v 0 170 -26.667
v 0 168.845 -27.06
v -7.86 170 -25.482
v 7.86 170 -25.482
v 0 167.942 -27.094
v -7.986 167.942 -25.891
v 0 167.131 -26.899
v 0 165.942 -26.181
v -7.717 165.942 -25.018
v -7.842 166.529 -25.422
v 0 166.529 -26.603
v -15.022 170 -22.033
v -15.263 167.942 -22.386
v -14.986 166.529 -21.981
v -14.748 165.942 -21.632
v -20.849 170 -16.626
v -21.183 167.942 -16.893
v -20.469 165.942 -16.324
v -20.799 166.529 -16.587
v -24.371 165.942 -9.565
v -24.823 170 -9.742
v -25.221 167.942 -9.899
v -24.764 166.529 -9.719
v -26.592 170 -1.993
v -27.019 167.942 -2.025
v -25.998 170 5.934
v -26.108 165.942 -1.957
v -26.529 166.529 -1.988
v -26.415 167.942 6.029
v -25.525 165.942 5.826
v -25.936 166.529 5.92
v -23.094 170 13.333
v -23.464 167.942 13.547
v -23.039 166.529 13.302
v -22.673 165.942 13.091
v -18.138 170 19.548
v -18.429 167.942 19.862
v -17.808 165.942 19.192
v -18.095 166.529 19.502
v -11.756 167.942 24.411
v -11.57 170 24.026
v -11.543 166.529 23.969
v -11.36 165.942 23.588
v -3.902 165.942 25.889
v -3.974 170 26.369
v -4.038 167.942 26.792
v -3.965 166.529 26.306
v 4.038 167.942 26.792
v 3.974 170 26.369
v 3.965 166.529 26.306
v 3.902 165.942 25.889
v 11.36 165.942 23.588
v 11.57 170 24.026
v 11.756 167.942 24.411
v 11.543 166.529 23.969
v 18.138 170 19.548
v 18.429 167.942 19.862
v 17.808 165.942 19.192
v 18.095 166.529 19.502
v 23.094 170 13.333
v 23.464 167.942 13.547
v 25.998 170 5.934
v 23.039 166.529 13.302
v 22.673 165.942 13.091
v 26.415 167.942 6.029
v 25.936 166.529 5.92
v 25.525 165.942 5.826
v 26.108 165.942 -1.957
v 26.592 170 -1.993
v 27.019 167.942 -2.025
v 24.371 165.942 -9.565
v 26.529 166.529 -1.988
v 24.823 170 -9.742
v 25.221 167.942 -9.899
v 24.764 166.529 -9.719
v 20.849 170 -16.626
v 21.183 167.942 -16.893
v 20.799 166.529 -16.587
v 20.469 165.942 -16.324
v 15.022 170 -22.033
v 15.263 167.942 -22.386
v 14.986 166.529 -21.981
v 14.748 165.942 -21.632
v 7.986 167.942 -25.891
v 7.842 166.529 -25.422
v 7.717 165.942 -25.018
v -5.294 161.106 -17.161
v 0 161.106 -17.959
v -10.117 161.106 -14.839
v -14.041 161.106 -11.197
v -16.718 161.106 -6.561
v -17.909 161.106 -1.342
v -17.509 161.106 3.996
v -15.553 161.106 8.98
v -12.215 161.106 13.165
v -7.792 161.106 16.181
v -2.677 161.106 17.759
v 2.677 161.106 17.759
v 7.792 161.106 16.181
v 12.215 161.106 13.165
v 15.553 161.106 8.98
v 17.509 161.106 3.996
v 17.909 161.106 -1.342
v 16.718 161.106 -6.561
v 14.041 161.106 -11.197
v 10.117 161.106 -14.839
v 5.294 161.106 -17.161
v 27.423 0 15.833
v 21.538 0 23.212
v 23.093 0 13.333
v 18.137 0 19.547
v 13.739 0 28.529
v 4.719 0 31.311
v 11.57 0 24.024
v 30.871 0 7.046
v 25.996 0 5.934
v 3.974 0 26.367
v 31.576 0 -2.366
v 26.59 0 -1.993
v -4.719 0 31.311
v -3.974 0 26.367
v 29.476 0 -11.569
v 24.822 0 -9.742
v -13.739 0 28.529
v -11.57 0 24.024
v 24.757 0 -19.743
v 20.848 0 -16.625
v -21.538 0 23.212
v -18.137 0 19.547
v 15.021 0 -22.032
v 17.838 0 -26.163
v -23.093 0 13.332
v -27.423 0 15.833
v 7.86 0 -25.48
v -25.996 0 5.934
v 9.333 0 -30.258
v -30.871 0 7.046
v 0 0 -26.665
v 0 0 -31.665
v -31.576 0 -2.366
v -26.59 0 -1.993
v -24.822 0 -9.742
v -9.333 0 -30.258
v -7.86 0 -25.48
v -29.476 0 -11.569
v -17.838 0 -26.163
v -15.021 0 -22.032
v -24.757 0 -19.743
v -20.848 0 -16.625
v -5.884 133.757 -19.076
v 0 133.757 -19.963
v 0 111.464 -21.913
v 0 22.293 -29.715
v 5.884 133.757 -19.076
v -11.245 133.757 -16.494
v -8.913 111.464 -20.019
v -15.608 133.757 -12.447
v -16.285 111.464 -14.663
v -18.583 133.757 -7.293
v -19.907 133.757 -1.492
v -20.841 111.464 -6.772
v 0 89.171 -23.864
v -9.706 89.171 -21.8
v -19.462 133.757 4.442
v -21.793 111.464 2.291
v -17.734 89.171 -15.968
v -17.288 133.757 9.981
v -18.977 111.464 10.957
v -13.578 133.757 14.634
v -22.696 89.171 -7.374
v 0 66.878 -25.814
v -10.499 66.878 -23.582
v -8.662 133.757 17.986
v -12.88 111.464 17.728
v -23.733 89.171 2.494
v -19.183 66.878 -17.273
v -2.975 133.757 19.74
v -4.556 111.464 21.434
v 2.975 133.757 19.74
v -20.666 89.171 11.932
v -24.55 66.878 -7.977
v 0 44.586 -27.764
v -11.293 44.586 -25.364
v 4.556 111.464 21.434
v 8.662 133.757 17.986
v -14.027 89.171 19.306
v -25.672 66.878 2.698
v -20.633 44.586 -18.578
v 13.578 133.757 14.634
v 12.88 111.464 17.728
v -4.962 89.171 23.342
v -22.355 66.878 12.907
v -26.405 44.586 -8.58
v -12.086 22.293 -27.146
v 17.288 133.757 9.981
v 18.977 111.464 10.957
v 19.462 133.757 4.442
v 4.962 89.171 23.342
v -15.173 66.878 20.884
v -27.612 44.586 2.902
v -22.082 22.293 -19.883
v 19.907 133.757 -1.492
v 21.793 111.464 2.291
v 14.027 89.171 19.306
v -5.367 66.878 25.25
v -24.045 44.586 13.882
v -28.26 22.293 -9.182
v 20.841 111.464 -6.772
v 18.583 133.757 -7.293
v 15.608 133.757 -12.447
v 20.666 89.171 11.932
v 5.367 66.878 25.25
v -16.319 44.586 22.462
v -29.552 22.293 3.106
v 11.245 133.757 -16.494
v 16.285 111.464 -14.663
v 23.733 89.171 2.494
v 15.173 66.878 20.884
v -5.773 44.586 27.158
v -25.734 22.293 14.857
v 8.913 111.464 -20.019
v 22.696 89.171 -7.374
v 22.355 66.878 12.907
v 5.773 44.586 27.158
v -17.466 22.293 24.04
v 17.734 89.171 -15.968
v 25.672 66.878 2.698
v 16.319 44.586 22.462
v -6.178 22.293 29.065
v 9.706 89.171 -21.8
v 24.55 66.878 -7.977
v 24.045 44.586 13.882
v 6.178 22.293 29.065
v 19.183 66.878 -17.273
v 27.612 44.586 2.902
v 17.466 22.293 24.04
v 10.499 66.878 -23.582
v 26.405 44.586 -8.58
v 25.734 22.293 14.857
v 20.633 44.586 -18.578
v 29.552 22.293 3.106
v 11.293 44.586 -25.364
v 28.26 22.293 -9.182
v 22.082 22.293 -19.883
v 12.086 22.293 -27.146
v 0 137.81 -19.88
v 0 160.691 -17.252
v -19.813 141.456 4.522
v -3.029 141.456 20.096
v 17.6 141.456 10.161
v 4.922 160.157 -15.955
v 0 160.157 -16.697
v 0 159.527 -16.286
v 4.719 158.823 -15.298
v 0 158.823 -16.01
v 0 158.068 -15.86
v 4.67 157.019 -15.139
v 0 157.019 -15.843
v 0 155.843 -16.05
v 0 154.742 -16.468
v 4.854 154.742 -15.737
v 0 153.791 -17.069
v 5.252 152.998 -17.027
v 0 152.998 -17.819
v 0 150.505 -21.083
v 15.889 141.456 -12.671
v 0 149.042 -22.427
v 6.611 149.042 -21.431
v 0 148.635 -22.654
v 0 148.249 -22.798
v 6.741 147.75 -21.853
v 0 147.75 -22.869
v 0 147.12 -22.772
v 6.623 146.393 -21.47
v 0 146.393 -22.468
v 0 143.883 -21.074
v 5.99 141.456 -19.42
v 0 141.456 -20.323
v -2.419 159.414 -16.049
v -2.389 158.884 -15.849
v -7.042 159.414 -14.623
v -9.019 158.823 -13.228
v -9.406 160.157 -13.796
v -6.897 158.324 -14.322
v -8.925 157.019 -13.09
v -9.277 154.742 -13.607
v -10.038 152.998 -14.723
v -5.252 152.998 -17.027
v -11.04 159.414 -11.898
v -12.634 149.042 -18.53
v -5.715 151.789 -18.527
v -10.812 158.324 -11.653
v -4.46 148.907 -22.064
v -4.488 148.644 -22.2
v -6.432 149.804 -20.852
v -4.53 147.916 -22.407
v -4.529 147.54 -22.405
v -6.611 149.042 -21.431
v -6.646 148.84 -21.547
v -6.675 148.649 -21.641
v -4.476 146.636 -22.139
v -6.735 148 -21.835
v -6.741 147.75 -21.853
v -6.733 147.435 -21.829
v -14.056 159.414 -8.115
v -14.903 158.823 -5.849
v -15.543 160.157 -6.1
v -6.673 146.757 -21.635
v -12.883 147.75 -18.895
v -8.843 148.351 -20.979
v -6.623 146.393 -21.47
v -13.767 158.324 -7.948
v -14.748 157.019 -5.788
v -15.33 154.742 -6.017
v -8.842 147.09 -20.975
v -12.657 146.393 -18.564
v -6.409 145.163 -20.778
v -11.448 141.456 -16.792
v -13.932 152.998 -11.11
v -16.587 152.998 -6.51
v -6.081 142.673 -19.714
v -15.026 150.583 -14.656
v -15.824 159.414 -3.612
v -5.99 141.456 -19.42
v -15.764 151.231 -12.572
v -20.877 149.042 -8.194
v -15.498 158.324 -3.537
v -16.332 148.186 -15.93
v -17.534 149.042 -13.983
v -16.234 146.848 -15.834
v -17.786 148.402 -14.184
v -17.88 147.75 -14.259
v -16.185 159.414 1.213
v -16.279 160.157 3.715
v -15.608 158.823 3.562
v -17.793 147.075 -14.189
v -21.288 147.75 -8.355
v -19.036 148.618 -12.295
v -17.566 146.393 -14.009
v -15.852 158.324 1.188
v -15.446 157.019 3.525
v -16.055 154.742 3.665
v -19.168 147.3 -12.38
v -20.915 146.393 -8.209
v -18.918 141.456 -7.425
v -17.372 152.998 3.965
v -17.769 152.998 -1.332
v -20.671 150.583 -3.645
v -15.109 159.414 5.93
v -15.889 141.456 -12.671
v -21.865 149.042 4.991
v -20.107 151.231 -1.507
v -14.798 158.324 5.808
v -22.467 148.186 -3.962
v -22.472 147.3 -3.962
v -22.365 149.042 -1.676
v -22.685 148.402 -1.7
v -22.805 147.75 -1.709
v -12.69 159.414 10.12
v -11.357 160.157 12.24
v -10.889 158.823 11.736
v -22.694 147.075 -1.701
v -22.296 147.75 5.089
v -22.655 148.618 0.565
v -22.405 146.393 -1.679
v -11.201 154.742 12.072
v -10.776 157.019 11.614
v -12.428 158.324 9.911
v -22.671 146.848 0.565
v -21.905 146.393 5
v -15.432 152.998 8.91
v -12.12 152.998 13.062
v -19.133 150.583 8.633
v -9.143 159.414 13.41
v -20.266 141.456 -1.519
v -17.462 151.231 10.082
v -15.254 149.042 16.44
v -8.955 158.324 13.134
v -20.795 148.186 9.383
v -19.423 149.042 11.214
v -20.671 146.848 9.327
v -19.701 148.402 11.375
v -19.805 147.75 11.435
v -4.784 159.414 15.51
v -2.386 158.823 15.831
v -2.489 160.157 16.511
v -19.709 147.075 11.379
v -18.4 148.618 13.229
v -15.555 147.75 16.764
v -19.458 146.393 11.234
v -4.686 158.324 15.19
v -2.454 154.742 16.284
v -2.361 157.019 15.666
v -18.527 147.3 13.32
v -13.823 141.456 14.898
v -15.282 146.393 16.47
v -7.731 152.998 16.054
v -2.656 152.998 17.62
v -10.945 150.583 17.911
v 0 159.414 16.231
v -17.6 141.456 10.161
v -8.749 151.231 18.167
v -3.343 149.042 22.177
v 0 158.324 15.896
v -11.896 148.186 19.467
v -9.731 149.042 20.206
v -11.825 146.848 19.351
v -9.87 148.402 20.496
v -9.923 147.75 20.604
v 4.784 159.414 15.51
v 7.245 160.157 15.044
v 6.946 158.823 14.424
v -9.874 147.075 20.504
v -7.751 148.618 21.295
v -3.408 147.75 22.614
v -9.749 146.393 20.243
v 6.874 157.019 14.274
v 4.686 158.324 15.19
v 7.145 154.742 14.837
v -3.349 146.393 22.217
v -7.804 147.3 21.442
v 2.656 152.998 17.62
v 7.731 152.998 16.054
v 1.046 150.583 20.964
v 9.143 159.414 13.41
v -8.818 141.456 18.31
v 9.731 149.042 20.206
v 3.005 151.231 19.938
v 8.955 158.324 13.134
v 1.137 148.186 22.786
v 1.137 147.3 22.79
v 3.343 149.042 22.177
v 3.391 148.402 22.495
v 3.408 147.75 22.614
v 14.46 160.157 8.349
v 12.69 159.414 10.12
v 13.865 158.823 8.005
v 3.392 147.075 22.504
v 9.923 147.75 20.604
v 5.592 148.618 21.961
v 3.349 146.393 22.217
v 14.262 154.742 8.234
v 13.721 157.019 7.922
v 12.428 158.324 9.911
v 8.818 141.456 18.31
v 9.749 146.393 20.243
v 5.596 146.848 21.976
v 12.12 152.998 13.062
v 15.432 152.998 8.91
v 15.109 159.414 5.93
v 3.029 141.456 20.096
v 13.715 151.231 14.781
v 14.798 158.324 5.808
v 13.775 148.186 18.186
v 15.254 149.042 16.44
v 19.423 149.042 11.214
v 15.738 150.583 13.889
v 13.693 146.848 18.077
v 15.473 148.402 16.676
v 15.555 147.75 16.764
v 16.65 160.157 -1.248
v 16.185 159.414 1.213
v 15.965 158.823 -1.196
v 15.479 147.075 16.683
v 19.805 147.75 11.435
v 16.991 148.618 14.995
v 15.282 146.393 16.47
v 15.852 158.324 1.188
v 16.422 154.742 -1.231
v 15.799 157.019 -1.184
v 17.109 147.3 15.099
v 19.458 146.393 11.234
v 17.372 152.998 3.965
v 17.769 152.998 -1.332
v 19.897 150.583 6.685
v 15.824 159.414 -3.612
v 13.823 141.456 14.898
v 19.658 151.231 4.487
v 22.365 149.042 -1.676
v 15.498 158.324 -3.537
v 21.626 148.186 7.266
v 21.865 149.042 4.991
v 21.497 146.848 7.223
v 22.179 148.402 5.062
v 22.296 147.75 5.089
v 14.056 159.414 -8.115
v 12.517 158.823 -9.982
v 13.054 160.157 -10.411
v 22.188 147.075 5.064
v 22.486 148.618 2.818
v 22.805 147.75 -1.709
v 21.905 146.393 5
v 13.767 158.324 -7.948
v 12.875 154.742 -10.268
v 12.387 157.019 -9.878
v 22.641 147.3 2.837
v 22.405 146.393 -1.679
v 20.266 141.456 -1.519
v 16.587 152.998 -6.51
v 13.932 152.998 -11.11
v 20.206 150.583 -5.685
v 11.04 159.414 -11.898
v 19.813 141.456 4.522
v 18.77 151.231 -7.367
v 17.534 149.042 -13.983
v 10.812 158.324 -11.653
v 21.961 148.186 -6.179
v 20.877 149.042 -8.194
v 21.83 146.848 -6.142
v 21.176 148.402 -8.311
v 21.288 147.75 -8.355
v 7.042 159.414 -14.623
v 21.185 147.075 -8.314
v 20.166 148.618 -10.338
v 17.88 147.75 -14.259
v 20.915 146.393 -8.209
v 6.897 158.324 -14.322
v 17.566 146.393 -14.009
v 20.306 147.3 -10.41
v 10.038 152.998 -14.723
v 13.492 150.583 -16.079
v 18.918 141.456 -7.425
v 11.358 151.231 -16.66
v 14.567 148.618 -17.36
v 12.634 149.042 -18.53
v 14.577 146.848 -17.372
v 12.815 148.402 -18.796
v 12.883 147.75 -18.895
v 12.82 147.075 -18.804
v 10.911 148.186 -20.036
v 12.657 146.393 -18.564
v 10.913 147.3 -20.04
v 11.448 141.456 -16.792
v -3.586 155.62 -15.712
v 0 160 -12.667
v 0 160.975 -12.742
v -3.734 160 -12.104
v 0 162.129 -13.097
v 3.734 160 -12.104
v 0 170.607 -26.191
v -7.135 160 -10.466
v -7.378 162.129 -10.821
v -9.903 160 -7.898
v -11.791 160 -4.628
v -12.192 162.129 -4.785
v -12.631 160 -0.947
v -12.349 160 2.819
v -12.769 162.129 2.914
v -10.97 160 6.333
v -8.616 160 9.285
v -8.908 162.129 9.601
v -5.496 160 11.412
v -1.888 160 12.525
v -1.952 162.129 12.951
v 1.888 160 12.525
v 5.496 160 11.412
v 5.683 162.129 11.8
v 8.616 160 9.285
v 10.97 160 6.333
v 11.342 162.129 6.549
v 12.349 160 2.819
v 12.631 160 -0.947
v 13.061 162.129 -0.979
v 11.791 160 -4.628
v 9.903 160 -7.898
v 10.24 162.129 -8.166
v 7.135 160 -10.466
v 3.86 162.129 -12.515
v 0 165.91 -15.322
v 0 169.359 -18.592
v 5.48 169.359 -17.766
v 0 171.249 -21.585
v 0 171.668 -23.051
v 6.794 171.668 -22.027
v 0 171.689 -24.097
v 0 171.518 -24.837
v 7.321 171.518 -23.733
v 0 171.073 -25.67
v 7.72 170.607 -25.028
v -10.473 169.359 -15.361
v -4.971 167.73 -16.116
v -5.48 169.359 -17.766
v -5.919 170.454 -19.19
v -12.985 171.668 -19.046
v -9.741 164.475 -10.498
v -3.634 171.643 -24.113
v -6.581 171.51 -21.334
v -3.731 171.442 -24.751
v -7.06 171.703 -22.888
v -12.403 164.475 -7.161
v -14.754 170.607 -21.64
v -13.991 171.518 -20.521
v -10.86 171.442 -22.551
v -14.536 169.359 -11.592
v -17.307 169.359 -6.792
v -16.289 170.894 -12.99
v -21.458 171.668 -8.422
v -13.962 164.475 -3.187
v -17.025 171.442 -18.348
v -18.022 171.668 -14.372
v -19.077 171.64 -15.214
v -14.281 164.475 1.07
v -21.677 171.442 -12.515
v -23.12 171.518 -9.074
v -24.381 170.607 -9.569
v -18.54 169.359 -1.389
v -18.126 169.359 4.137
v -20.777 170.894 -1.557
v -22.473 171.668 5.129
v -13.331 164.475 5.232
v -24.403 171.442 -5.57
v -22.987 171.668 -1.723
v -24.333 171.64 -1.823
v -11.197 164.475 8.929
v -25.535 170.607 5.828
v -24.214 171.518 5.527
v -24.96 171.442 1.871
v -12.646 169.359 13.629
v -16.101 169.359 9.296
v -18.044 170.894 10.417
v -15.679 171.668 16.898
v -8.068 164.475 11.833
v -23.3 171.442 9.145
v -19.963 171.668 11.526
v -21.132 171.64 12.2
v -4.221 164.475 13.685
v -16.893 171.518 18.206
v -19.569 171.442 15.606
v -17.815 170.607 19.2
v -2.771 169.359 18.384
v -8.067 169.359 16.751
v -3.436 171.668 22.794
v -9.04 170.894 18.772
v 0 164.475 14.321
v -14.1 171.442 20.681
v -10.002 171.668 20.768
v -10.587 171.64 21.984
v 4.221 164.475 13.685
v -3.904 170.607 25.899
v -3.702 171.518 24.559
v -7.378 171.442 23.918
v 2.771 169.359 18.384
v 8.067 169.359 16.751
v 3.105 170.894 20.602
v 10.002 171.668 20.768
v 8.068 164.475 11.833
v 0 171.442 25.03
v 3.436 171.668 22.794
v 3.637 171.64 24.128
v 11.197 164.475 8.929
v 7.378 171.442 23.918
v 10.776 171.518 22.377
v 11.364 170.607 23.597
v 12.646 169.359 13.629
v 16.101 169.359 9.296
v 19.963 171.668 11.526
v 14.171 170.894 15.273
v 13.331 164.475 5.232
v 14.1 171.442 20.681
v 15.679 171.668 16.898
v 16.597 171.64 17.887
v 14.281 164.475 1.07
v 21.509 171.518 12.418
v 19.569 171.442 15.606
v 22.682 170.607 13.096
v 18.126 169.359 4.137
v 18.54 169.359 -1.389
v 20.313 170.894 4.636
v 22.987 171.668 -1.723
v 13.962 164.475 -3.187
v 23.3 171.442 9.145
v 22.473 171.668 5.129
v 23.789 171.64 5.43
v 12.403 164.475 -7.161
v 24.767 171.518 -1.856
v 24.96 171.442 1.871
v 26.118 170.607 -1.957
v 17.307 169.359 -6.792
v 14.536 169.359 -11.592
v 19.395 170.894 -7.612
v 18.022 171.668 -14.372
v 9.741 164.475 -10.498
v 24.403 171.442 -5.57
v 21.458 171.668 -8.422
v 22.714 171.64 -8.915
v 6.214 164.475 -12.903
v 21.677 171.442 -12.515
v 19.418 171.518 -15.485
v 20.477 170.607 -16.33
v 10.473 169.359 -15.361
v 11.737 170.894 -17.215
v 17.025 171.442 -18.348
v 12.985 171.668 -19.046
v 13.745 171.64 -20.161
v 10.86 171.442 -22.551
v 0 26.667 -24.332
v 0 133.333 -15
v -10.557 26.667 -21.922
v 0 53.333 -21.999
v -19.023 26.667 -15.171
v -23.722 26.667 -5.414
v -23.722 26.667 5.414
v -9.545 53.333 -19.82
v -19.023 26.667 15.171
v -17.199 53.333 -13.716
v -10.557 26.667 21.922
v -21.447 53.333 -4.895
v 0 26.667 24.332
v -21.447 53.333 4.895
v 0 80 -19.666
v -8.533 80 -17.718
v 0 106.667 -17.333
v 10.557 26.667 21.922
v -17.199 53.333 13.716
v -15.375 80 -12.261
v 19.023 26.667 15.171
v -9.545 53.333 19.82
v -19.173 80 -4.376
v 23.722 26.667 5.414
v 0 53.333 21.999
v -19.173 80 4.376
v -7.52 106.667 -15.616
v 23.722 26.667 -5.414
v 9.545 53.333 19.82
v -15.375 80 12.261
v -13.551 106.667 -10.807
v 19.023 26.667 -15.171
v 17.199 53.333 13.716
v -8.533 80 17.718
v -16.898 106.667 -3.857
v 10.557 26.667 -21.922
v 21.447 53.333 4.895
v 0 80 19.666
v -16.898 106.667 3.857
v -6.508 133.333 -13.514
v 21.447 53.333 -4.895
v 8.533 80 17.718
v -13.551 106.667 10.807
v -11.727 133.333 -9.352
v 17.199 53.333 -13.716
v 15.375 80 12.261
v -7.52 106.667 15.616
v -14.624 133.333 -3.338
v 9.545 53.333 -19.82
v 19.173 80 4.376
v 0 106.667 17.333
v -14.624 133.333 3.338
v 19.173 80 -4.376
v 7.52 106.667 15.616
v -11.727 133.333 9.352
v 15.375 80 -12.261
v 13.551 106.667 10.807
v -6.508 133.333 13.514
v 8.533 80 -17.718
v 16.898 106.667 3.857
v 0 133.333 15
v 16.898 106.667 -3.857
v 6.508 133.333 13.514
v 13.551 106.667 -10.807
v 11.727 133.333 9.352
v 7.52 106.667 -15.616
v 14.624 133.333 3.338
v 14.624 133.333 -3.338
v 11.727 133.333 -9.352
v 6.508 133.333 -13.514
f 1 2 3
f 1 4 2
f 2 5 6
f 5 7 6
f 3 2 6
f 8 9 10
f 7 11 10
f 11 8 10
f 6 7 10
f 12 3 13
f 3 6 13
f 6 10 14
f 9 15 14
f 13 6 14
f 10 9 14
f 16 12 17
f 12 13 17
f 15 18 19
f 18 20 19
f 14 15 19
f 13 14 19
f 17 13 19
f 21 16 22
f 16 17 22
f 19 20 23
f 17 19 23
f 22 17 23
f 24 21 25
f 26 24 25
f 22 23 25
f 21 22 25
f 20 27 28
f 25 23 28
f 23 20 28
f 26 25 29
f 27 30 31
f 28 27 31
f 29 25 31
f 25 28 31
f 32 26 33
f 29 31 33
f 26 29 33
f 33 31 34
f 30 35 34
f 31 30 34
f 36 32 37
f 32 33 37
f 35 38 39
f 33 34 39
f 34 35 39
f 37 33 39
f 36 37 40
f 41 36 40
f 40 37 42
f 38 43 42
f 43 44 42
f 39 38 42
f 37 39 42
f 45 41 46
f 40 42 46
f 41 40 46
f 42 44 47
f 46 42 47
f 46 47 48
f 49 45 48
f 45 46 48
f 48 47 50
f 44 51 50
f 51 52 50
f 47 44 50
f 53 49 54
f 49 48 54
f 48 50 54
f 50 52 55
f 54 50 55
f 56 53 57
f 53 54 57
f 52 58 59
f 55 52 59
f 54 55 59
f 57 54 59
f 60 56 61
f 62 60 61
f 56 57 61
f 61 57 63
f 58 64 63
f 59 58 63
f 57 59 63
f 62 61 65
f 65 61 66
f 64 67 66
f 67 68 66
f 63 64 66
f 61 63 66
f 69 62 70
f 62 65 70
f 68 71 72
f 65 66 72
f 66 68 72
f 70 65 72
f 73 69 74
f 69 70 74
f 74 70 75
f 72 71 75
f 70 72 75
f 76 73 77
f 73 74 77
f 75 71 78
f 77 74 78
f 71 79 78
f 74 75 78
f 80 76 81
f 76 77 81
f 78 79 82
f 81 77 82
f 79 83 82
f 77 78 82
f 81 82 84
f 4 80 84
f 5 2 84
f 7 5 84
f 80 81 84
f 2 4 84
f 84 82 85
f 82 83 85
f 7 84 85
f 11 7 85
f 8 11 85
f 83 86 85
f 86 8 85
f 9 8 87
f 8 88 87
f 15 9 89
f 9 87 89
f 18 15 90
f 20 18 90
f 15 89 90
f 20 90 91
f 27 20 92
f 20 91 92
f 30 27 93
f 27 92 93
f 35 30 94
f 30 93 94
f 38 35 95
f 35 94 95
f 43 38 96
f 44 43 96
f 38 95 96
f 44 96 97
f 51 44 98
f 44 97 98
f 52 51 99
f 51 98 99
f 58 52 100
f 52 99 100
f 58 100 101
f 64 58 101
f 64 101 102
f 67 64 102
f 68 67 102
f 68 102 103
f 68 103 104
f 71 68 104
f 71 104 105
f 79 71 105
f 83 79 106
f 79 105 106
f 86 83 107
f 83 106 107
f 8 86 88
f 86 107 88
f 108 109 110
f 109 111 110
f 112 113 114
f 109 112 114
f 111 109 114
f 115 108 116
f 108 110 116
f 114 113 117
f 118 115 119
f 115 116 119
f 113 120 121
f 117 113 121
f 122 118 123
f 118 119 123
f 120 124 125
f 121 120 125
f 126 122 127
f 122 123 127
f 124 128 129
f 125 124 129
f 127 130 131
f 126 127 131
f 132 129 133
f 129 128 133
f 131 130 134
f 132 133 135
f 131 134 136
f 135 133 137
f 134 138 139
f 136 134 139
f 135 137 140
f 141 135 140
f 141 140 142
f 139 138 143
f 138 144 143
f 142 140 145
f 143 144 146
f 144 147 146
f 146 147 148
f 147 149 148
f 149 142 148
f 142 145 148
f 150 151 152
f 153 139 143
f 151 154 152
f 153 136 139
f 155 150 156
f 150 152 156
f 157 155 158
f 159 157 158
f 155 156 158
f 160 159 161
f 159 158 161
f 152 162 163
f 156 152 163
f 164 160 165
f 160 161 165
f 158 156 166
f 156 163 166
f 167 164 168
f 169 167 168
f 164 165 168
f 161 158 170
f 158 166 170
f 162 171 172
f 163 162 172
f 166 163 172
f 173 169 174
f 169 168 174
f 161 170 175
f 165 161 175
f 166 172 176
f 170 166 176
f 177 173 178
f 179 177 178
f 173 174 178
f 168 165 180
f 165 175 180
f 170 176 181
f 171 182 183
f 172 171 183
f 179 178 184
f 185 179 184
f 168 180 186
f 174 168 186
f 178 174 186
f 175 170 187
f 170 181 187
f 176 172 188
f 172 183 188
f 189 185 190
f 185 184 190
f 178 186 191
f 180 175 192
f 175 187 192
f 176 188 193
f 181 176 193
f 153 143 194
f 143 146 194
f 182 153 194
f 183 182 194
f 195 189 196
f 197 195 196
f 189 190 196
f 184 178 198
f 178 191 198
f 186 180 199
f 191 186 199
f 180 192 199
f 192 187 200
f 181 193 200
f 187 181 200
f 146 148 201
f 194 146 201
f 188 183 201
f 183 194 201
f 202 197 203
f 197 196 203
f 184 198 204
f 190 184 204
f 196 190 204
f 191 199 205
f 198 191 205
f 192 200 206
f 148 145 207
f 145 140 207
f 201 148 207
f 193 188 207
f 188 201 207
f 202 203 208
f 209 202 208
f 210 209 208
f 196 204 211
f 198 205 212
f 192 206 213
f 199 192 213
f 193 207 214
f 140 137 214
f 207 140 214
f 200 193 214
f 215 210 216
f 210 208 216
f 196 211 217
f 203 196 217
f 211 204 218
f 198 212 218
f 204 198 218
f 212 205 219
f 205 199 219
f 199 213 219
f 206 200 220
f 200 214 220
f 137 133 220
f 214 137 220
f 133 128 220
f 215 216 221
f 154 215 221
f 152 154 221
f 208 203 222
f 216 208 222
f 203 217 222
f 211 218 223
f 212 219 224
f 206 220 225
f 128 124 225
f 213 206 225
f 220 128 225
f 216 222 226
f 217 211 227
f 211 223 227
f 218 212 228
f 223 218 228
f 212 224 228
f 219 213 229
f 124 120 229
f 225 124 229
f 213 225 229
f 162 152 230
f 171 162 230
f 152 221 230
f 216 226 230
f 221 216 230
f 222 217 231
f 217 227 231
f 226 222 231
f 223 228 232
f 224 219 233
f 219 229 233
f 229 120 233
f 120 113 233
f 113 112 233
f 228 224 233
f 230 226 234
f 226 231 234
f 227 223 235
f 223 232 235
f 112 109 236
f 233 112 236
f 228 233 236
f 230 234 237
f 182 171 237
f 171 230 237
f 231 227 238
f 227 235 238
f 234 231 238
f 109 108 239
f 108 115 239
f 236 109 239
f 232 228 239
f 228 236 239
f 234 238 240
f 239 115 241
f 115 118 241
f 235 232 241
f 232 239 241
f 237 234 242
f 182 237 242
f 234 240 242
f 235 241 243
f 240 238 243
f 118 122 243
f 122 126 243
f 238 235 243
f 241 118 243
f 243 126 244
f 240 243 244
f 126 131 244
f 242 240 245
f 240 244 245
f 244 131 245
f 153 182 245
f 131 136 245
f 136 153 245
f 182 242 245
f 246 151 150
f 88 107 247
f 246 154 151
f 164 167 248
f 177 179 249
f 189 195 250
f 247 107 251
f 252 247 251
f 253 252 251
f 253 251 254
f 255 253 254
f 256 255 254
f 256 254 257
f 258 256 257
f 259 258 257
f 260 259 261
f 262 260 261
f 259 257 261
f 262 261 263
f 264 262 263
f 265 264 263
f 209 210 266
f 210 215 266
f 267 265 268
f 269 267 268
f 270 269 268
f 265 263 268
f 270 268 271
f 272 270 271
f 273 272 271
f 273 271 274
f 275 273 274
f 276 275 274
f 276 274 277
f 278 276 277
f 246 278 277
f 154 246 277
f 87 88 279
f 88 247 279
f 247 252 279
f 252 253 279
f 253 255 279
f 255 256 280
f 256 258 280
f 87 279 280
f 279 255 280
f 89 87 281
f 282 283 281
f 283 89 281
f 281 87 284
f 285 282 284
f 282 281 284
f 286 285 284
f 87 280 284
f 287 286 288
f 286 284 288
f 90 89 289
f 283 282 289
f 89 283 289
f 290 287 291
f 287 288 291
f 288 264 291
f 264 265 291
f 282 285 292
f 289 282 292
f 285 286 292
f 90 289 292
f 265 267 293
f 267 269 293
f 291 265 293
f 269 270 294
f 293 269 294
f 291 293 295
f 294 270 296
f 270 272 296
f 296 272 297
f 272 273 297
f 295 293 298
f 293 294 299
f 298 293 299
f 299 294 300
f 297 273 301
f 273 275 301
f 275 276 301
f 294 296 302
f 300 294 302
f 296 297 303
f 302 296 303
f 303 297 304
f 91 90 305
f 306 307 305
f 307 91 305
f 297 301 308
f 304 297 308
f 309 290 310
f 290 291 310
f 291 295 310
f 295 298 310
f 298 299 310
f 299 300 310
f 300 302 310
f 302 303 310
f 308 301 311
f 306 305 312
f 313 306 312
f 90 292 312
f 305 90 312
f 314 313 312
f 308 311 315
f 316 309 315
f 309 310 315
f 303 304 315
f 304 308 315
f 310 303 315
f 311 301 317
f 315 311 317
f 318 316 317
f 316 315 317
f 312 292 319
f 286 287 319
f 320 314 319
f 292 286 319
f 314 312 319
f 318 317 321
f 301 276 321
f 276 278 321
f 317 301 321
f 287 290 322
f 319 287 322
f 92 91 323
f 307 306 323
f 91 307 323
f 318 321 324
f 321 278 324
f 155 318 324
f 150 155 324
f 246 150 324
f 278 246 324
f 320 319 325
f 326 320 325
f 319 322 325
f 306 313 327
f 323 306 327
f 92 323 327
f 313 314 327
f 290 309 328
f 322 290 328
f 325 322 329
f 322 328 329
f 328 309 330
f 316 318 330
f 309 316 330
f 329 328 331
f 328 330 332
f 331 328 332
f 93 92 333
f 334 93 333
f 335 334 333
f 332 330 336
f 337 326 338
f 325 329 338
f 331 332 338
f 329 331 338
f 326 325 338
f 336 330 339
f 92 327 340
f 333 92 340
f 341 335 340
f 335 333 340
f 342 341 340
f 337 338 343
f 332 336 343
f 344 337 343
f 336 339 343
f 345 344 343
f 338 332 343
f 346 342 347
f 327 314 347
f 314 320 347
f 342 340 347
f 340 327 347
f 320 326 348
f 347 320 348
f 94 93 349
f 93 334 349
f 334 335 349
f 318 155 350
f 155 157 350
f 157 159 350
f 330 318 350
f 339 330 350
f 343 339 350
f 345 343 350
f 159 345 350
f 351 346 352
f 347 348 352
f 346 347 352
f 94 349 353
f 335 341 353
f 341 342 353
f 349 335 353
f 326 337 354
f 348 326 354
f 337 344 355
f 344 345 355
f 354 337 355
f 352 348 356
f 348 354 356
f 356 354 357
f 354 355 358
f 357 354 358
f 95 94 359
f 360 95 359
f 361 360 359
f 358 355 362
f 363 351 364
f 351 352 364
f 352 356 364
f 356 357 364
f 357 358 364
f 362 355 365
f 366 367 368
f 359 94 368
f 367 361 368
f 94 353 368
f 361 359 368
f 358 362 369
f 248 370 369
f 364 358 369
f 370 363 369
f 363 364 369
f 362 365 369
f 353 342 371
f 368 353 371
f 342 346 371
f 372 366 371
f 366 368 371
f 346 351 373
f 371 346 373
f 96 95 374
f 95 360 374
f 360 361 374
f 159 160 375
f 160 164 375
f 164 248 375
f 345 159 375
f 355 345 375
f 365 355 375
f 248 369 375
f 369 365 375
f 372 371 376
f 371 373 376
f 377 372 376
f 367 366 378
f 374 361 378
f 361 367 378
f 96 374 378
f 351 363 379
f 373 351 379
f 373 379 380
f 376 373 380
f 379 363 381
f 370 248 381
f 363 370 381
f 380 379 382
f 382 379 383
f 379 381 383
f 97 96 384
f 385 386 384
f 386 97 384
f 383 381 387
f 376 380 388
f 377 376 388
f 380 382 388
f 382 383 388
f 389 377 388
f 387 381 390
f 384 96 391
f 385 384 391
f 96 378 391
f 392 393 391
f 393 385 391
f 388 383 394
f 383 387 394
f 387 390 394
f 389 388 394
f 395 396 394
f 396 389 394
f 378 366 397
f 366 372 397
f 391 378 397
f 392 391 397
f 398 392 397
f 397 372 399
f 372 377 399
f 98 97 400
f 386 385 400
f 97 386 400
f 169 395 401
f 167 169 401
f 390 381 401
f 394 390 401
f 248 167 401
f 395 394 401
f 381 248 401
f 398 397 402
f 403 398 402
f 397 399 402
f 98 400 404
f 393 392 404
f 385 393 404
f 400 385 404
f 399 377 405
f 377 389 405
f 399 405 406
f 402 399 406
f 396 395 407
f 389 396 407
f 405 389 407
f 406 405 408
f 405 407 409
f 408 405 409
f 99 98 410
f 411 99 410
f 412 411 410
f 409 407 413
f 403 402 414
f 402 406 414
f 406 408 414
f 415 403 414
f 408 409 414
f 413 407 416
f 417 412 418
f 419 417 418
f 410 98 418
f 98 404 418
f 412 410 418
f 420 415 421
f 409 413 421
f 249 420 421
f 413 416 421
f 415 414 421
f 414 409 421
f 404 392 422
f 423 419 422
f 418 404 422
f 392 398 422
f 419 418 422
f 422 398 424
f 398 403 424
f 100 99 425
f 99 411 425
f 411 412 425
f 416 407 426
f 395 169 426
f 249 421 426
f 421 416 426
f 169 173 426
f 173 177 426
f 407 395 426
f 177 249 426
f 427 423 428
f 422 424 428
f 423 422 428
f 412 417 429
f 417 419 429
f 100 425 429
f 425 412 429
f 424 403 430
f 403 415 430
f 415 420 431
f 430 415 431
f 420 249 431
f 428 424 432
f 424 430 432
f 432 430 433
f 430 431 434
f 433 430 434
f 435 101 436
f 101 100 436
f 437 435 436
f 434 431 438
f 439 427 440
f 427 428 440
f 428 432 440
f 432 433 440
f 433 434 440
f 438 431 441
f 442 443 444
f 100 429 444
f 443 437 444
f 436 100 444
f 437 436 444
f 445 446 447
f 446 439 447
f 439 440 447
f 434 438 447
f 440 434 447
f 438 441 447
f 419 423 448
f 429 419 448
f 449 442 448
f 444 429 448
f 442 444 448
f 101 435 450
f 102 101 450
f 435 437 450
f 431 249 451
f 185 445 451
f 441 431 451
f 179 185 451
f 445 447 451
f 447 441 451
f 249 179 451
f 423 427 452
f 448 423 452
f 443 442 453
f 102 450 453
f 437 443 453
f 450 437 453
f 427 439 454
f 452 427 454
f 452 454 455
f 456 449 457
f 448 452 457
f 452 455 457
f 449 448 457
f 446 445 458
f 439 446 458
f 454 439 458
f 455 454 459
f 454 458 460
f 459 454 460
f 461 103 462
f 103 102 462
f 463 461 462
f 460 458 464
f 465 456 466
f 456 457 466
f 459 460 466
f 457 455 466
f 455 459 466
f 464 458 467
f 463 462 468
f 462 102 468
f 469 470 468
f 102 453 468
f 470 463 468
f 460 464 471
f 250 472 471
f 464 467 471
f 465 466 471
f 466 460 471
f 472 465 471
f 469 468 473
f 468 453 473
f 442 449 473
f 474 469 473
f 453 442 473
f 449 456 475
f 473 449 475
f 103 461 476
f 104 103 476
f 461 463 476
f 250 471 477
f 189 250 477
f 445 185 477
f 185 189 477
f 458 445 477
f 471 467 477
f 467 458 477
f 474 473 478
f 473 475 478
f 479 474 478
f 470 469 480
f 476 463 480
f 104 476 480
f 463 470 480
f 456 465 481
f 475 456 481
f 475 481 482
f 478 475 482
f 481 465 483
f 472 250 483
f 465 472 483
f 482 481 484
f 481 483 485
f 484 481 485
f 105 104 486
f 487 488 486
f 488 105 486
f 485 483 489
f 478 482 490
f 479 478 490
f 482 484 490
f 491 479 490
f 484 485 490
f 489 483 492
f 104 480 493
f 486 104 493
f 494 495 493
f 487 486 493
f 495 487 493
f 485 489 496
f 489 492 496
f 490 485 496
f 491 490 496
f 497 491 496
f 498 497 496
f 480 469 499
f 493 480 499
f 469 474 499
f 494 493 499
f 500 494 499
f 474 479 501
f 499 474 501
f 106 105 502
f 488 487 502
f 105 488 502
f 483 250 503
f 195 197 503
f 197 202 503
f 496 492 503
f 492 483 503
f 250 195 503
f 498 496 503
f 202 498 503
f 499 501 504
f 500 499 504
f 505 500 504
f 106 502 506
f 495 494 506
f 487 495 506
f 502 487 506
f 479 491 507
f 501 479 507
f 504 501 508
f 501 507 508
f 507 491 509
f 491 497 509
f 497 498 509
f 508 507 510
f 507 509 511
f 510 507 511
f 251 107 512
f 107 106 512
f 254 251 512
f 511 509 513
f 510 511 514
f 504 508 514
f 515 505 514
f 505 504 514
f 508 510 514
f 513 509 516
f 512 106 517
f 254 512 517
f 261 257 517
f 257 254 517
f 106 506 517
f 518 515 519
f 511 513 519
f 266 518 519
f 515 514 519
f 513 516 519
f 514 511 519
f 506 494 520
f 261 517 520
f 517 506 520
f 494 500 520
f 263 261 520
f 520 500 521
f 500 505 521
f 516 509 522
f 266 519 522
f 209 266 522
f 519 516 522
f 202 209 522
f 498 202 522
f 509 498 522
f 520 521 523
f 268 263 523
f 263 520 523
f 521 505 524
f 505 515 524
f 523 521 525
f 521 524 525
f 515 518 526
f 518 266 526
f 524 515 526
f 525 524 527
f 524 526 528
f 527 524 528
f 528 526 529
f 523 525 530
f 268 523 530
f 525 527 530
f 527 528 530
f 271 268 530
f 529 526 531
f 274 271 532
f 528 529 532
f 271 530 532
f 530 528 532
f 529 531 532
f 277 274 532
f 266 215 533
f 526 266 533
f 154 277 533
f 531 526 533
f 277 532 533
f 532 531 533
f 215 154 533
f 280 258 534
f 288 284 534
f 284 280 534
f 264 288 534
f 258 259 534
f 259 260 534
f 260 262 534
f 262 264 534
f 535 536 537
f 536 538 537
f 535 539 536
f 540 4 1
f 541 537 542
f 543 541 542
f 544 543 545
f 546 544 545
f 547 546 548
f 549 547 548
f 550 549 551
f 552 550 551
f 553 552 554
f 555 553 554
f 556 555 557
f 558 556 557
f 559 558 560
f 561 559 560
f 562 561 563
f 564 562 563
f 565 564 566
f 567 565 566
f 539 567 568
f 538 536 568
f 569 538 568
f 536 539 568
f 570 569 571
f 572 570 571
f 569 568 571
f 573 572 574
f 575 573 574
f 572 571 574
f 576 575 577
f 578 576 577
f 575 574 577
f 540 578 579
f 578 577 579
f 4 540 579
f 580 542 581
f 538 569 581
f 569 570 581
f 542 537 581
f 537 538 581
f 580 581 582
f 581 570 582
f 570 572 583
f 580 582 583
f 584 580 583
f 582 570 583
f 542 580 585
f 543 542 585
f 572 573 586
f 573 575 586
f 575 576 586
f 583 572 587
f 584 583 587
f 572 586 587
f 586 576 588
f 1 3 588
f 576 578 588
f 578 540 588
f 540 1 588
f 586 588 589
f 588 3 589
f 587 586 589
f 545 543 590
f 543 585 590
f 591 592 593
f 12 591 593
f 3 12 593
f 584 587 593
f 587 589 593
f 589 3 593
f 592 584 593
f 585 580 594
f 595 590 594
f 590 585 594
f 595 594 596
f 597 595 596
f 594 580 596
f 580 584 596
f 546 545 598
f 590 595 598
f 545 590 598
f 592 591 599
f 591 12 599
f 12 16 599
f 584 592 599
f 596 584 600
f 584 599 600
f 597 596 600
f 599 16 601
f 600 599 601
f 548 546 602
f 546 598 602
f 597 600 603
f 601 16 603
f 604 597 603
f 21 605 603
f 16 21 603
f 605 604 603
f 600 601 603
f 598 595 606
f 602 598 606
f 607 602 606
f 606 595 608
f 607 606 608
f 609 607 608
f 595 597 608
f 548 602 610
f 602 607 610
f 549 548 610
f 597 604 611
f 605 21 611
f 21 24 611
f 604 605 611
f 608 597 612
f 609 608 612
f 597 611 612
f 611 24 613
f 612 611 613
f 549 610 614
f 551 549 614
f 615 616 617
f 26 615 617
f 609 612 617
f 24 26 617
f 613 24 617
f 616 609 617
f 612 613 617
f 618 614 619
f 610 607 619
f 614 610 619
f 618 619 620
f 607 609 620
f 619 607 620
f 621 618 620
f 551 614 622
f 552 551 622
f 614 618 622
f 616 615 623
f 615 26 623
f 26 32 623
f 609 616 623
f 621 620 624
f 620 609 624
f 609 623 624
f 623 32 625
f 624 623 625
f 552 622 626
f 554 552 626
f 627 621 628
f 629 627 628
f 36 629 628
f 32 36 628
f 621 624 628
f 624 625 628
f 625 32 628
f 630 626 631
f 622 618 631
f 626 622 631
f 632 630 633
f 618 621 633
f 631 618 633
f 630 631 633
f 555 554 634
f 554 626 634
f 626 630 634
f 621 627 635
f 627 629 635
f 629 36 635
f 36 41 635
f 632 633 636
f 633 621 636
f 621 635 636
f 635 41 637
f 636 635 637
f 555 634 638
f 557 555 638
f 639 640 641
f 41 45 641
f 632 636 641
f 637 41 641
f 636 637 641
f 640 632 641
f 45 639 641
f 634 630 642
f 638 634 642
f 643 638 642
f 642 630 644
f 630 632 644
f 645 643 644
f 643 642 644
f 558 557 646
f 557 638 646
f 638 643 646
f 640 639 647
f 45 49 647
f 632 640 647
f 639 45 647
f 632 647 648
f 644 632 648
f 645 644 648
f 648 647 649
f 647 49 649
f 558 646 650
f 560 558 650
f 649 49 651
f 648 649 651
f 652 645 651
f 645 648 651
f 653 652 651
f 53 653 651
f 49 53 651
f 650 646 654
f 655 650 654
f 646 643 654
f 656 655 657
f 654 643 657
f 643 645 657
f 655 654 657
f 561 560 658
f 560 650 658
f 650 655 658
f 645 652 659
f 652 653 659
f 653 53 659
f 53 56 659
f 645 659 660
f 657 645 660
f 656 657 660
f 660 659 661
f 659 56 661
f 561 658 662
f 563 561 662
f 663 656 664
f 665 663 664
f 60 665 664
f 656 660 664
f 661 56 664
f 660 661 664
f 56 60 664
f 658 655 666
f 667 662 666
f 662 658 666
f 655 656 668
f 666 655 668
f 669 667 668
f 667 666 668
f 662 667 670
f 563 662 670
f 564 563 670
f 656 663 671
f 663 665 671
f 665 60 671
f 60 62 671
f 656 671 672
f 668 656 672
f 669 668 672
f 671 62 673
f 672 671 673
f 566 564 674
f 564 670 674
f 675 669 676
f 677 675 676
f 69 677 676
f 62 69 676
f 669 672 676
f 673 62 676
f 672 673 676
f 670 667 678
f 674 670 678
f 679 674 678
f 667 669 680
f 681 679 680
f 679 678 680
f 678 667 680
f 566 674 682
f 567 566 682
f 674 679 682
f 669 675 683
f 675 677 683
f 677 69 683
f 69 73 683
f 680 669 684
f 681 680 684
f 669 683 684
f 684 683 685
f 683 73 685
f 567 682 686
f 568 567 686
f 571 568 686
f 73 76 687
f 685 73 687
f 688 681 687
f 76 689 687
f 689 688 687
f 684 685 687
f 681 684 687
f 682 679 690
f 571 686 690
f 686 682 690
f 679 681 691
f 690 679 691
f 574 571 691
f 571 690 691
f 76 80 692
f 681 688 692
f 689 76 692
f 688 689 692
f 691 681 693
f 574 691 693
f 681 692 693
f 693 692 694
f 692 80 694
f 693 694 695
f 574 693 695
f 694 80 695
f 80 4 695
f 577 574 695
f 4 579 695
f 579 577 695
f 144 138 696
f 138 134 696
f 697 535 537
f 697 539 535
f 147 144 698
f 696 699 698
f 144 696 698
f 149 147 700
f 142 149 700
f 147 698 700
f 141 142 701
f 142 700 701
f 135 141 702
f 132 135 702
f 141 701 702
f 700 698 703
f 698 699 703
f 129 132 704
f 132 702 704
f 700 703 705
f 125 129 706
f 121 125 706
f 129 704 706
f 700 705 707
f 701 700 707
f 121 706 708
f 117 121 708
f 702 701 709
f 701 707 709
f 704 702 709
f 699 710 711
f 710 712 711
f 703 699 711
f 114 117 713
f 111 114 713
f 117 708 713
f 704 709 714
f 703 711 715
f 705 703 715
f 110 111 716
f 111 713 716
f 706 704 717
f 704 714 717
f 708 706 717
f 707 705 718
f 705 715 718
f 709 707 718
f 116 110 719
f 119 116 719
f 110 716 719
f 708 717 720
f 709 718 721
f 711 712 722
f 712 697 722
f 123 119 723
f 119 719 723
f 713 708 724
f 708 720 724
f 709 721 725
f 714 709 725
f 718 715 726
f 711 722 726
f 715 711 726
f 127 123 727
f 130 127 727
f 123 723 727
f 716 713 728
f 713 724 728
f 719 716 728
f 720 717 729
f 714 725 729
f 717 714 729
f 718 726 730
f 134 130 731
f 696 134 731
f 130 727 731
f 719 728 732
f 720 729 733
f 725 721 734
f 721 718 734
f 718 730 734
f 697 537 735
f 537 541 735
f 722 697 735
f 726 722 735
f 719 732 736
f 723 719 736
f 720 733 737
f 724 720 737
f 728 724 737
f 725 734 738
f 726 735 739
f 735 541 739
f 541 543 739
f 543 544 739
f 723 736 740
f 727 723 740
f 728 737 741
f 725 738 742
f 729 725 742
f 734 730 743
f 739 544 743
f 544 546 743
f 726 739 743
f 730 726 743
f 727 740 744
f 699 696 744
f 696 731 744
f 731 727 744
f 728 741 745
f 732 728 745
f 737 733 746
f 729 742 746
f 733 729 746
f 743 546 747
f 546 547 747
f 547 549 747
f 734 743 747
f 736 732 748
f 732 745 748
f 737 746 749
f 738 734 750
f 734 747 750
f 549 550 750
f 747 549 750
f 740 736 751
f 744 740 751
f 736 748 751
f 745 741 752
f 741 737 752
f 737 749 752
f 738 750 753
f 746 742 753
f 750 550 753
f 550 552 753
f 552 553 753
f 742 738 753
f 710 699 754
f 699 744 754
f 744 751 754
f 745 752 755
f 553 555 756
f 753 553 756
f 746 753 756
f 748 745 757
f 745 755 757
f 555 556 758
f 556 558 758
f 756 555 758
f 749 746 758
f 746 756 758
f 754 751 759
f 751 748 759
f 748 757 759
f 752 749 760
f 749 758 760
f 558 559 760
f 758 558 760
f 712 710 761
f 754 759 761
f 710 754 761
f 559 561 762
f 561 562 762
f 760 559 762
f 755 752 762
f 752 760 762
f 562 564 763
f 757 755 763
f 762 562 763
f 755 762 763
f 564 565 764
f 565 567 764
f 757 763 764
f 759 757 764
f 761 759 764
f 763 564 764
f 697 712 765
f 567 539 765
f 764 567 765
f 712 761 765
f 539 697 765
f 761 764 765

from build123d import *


with BuildPart() as part:
    # Sketch1 → Revolve1 (revolve)
    with BuildSketch(Plane.XY, mode=Mode.PRIVATE) as revolve1_sk:
        with BuildLine():
            Line((-26.665, 0), (-12.666813836, 160))
            add(Edge.make_bspline(
                [(-12.666813836, 160), (-12.306063793, 164.123391853), (-22.593841128, 176.138404535), (-26.666813836, 170)],
                knots=[0, 0, 0, 0, 1, 1, 1, 1], degree=3))
            add(Edge.make_bspline(
                [(-26.666813836, 170), (-27.754385906, 167.821657289), (-26.181066368, 165.941771752)],
                knots=[0, 0, 0, 1, 1, 1], degree=2))
            Line((-26.181066368, 165.941771752), (-17.959328183, 161.10645018))
            add(Edge.make_bspline(
                [(-17.959328183, 161.10645018), (-15.294831649, 159.923164093), (-15.474513264, 153.742286346), (-20.41748834, 151.432742663), (-23.752458344, 147.815263671), (-20.548654977, 143.94239304), (-19.886137527, 138.797475761), (-19.766435284, 136.001217037), (-19.962779385, 133.756993686)],
                knots=[0, 0, 0, 0, 0.247129658, 0.423699063, 0.532203519, 0.643266944, 0.840064638, 1, 1, 1, 1], degree=3))
            Line((-19.962779385, 133.756993686), (-31.665, 0))
            Line((-31.665, 0), (-26.665, 0))
        make_face()
    revolve(revolve1_sk.sketch.rotate(Axis((0, 0, 0), (0, 1, 0)), 270), axis=Axis((0, 0, 0), (0, 1, 0)))


solid = part.part
